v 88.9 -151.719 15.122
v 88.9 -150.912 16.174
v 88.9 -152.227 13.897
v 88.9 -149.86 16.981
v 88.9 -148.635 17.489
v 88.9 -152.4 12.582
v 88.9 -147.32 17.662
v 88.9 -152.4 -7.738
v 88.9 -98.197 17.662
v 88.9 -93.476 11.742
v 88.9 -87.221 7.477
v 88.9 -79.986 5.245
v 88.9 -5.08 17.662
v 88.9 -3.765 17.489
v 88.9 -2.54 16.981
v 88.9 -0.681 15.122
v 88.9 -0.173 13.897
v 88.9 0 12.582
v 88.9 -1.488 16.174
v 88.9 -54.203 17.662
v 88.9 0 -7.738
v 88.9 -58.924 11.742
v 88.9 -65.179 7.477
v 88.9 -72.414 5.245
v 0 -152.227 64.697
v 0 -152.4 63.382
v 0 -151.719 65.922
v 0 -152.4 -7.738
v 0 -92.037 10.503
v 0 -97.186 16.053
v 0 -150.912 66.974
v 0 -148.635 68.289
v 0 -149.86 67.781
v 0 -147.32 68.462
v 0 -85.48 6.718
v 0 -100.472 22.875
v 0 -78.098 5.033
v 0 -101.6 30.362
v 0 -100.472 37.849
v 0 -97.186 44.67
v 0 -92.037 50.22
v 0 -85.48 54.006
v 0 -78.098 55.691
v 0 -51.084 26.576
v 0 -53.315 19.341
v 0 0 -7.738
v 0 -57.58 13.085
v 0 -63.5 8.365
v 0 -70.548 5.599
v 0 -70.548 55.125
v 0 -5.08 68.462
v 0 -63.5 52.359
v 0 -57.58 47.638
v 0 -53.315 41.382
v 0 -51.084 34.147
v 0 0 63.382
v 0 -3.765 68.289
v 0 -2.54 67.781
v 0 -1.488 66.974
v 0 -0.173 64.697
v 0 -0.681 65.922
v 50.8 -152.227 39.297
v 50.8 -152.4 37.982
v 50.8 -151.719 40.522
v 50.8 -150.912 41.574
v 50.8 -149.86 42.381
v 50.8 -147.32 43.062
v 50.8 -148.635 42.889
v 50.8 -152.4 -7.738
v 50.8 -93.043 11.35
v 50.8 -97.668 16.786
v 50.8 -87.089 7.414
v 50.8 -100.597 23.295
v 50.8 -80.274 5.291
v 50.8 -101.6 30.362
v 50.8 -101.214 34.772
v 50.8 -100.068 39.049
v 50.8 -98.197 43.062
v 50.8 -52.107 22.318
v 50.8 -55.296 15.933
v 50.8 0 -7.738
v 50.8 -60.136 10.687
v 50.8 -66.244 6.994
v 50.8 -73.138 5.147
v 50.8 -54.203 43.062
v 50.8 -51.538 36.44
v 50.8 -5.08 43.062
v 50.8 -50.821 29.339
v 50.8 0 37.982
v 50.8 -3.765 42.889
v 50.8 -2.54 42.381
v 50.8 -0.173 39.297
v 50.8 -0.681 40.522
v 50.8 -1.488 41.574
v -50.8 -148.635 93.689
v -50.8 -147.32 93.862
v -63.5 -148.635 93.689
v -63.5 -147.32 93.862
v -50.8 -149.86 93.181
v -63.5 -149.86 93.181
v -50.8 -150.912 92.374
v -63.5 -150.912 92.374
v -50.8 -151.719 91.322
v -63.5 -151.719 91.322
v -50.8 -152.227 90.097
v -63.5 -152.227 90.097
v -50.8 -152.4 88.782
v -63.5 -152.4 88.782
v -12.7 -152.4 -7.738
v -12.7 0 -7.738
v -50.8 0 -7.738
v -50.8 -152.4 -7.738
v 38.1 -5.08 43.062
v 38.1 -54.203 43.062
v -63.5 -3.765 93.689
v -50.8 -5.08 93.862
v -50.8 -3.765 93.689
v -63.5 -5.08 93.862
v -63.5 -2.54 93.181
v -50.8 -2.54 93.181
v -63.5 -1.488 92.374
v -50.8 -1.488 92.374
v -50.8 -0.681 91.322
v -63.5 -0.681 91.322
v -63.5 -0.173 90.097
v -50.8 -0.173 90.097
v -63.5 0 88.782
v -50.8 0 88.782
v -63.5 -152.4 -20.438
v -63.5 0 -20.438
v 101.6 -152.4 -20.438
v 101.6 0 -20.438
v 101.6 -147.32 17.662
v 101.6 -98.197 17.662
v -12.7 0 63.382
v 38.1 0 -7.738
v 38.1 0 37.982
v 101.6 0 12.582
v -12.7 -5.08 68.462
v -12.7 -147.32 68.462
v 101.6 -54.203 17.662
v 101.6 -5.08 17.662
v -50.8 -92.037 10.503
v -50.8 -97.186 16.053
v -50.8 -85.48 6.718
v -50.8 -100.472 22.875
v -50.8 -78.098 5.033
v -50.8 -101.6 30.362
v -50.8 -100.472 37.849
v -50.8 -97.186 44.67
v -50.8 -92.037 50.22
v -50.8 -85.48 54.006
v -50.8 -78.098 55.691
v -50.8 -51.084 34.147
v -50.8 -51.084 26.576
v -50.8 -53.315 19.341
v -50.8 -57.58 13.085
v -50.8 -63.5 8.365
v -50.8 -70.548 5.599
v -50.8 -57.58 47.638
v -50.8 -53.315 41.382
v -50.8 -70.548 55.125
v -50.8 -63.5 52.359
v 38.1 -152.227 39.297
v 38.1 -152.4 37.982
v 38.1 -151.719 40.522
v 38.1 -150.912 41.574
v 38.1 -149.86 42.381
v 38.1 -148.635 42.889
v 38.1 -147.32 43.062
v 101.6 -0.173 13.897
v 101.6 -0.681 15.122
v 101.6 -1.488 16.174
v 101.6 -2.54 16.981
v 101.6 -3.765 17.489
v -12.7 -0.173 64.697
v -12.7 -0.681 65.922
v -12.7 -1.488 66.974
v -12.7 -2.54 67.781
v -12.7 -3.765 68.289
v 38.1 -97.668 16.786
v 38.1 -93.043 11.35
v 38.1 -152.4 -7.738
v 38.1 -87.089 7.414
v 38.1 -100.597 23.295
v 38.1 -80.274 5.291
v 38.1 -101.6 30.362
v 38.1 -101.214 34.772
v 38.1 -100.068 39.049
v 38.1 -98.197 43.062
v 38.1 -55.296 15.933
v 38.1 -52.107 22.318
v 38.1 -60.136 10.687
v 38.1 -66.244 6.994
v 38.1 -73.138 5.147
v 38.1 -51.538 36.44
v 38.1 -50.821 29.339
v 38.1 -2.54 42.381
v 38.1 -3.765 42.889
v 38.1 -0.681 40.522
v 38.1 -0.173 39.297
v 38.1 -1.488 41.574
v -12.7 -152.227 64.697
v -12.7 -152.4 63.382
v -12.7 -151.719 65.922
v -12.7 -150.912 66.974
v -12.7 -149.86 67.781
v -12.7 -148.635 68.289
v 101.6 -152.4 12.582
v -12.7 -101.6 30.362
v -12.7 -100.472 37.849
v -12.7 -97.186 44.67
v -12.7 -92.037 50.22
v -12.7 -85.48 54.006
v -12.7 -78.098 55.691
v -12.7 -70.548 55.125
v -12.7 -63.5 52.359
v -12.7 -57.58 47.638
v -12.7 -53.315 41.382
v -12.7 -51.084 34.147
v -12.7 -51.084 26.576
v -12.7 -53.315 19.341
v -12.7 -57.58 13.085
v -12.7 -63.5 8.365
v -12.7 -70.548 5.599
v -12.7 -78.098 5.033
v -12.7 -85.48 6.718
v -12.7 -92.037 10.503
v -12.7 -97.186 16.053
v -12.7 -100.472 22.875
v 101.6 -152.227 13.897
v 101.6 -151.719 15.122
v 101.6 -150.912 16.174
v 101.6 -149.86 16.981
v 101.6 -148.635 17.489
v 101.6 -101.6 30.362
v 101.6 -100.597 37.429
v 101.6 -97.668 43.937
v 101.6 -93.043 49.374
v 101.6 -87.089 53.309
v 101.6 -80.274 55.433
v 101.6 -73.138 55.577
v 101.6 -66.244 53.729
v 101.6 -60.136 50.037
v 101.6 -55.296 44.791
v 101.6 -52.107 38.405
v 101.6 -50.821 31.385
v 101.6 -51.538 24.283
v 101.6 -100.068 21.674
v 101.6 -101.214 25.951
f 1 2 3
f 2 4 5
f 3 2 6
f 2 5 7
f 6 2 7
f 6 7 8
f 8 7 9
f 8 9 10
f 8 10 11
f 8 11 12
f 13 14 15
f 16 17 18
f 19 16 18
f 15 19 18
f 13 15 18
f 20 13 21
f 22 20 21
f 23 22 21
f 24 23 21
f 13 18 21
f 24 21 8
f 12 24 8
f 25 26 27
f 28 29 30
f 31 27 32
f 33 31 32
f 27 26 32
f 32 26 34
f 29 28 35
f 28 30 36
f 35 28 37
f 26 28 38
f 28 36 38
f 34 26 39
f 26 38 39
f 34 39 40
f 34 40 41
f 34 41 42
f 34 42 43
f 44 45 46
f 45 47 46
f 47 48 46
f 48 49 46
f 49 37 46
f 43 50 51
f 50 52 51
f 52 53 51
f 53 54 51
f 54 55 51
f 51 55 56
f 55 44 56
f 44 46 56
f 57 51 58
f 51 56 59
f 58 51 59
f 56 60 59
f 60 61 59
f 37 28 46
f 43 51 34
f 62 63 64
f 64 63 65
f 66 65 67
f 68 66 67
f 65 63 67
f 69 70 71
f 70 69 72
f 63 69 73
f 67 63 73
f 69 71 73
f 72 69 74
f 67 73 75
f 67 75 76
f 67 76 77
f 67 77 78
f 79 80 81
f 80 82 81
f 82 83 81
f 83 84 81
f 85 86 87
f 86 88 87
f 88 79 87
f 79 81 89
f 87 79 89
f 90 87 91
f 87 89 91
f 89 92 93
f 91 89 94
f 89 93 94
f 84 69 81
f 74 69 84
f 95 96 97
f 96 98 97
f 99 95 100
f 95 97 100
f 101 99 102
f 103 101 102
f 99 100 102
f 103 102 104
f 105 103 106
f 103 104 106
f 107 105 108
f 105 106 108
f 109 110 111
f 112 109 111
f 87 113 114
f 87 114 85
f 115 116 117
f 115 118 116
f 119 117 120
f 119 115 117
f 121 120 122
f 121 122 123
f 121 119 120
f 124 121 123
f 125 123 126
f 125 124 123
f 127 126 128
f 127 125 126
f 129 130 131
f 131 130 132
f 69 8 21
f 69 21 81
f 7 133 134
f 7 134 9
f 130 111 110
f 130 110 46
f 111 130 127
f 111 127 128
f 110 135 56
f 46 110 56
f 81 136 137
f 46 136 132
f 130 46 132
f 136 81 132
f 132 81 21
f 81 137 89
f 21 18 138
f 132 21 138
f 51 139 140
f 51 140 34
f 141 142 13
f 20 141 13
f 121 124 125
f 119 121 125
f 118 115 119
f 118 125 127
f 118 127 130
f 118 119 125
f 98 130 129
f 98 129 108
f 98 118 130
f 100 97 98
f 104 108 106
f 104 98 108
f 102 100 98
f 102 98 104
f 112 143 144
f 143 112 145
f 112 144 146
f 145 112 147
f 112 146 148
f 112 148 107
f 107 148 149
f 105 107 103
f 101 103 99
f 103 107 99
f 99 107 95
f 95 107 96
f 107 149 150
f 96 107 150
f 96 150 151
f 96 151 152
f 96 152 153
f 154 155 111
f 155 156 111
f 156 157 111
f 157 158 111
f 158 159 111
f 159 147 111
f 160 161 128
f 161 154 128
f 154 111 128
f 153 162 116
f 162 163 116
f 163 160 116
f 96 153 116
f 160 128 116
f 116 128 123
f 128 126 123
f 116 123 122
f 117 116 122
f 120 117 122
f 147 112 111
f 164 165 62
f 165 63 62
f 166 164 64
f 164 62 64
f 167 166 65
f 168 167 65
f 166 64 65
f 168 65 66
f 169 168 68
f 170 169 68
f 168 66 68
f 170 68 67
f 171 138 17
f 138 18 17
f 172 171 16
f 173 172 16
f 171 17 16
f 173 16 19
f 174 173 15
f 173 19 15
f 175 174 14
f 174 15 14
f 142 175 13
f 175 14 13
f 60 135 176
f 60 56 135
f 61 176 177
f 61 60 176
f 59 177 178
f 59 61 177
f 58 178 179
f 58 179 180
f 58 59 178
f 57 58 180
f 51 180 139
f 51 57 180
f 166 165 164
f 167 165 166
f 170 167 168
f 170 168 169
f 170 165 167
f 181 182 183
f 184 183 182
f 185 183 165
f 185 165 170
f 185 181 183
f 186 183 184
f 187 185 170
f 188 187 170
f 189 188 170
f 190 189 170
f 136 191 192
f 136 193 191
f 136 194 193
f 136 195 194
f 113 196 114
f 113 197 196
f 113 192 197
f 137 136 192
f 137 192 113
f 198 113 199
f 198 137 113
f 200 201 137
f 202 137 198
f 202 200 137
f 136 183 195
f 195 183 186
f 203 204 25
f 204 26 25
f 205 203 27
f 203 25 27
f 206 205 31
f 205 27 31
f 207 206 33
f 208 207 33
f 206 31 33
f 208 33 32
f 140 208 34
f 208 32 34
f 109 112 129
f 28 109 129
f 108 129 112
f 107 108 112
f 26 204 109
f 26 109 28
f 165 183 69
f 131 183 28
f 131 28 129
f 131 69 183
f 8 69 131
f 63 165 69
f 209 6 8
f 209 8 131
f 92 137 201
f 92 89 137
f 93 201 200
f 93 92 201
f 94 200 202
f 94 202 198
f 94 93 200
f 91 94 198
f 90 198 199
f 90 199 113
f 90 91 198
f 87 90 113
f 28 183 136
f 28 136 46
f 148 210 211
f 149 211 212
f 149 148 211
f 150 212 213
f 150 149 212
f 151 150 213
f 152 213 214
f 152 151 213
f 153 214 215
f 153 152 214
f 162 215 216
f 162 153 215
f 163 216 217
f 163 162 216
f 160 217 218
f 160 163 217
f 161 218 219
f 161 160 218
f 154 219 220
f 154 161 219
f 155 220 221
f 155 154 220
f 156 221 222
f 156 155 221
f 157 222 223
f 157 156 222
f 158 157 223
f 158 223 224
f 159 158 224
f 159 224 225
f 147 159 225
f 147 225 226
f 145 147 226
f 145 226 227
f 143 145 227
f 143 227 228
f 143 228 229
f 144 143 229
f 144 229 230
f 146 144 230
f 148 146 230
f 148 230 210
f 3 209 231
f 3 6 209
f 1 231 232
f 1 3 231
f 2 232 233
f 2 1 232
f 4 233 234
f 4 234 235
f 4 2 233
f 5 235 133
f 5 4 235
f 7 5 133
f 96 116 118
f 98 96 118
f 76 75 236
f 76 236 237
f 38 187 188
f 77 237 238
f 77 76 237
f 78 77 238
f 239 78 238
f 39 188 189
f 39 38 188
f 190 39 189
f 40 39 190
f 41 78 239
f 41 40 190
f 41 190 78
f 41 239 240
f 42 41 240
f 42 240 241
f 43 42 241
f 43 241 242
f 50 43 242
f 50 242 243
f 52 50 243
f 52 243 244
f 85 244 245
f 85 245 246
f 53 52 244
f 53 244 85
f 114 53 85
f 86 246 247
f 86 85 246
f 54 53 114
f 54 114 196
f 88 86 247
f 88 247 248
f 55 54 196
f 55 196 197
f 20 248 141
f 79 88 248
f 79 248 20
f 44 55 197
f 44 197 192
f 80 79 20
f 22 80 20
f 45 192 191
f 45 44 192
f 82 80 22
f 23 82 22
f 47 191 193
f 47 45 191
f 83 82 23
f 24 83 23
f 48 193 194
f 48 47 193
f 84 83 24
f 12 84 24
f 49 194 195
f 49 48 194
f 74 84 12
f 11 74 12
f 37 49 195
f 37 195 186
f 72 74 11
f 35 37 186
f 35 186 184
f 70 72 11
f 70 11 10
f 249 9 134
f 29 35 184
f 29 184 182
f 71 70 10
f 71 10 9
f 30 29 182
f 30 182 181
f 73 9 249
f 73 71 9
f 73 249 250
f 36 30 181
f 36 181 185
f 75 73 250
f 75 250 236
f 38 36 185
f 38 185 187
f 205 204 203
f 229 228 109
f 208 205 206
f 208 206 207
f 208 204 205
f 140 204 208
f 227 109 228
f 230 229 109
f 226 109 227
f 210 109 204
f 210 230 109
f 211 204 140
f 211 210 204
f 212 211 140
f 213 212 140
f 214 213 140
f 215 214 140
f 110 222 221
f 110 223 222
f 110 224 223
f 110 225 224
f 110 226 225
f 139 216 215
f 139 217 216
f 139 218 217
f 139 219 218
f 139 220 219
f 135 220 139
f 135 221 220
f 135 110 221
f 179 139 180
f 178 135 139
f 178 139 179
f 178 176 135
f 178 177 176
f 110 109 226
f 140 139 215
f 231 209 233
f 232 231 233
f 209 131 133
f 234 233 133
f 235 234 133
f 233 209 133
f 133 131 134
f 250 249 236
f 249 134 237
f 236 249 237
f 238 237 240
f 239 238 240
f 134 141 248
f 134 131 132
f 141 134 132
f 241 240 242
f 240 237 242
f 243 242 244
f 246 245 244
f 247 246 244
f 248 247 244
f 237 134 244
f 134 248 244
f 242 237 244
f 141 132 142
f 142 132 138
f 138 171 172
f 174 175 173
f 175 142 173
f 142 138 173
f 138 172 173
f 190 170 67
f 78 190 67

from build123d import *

# Parameters (mm, degrees)
F0_W     = 12.7
F0_H     = 76.2
F0_H_2   = 50.8
F1_DEPTH = 152.4
F2_R     = 25.4
F3_DEPTH = 165.1
F4_R     = 5.08


with BuildPart() as f1:
    # F0 (on Front) → F1 (new body)
    with BuildSketch(Plane.XZ):
        Polygon((-50.8, 93.861793), (-63.5, 93.861793), (-63.5, -20.438207), (101.6, -20.438207), (101.6, 17.661793), (88.9, 17.661793), (88.9, -7.738207), (50.8, -7.738207), (38.1, -7.738207), (32.964252, -7.738207), (0, -7.738207), (-12.7, -7.738207), (-50.8, -7.738207), align=None)
        with Locations((-6.35, 30.361793)):
            Rectangle(F0_W, F0_H)
        with Locations((44.45, 17.661793)):
            Rectangle(F0_W, F0_H_2)
    extrude(amount=F1_DEPTH)

    # F2 (on face) → F3 (join)
    with BuildSketch(Plane(origin=(-63.5, 0, 0), x_dir=(0, -1, 0), z_dir=(-1, 0, 0))):
        with Locations((76.2, 30.361793)):
            Circle(F2_R)
    extrude(amount=-F3_DEPTH)

    # F4
    f4_edges = [f1.edges().sort_by_distance(p)[0] for p in [
        (-57.15, -152.4, 93.861793),
        (-57.15, 0, 93.861793),
        (-6.35, -152.4, 68.461793),
        (-6.35, 0, 68.461793),
        (44.45, 0, 43.061793),
        (44.45, -152.4, 43.061793),
        (95.25, -152.4, 17.661793),
        (95.25, 0, 17.661793),
    ]]
    fillet(f4_edges, radius=F4_R)


solid = f1.part
